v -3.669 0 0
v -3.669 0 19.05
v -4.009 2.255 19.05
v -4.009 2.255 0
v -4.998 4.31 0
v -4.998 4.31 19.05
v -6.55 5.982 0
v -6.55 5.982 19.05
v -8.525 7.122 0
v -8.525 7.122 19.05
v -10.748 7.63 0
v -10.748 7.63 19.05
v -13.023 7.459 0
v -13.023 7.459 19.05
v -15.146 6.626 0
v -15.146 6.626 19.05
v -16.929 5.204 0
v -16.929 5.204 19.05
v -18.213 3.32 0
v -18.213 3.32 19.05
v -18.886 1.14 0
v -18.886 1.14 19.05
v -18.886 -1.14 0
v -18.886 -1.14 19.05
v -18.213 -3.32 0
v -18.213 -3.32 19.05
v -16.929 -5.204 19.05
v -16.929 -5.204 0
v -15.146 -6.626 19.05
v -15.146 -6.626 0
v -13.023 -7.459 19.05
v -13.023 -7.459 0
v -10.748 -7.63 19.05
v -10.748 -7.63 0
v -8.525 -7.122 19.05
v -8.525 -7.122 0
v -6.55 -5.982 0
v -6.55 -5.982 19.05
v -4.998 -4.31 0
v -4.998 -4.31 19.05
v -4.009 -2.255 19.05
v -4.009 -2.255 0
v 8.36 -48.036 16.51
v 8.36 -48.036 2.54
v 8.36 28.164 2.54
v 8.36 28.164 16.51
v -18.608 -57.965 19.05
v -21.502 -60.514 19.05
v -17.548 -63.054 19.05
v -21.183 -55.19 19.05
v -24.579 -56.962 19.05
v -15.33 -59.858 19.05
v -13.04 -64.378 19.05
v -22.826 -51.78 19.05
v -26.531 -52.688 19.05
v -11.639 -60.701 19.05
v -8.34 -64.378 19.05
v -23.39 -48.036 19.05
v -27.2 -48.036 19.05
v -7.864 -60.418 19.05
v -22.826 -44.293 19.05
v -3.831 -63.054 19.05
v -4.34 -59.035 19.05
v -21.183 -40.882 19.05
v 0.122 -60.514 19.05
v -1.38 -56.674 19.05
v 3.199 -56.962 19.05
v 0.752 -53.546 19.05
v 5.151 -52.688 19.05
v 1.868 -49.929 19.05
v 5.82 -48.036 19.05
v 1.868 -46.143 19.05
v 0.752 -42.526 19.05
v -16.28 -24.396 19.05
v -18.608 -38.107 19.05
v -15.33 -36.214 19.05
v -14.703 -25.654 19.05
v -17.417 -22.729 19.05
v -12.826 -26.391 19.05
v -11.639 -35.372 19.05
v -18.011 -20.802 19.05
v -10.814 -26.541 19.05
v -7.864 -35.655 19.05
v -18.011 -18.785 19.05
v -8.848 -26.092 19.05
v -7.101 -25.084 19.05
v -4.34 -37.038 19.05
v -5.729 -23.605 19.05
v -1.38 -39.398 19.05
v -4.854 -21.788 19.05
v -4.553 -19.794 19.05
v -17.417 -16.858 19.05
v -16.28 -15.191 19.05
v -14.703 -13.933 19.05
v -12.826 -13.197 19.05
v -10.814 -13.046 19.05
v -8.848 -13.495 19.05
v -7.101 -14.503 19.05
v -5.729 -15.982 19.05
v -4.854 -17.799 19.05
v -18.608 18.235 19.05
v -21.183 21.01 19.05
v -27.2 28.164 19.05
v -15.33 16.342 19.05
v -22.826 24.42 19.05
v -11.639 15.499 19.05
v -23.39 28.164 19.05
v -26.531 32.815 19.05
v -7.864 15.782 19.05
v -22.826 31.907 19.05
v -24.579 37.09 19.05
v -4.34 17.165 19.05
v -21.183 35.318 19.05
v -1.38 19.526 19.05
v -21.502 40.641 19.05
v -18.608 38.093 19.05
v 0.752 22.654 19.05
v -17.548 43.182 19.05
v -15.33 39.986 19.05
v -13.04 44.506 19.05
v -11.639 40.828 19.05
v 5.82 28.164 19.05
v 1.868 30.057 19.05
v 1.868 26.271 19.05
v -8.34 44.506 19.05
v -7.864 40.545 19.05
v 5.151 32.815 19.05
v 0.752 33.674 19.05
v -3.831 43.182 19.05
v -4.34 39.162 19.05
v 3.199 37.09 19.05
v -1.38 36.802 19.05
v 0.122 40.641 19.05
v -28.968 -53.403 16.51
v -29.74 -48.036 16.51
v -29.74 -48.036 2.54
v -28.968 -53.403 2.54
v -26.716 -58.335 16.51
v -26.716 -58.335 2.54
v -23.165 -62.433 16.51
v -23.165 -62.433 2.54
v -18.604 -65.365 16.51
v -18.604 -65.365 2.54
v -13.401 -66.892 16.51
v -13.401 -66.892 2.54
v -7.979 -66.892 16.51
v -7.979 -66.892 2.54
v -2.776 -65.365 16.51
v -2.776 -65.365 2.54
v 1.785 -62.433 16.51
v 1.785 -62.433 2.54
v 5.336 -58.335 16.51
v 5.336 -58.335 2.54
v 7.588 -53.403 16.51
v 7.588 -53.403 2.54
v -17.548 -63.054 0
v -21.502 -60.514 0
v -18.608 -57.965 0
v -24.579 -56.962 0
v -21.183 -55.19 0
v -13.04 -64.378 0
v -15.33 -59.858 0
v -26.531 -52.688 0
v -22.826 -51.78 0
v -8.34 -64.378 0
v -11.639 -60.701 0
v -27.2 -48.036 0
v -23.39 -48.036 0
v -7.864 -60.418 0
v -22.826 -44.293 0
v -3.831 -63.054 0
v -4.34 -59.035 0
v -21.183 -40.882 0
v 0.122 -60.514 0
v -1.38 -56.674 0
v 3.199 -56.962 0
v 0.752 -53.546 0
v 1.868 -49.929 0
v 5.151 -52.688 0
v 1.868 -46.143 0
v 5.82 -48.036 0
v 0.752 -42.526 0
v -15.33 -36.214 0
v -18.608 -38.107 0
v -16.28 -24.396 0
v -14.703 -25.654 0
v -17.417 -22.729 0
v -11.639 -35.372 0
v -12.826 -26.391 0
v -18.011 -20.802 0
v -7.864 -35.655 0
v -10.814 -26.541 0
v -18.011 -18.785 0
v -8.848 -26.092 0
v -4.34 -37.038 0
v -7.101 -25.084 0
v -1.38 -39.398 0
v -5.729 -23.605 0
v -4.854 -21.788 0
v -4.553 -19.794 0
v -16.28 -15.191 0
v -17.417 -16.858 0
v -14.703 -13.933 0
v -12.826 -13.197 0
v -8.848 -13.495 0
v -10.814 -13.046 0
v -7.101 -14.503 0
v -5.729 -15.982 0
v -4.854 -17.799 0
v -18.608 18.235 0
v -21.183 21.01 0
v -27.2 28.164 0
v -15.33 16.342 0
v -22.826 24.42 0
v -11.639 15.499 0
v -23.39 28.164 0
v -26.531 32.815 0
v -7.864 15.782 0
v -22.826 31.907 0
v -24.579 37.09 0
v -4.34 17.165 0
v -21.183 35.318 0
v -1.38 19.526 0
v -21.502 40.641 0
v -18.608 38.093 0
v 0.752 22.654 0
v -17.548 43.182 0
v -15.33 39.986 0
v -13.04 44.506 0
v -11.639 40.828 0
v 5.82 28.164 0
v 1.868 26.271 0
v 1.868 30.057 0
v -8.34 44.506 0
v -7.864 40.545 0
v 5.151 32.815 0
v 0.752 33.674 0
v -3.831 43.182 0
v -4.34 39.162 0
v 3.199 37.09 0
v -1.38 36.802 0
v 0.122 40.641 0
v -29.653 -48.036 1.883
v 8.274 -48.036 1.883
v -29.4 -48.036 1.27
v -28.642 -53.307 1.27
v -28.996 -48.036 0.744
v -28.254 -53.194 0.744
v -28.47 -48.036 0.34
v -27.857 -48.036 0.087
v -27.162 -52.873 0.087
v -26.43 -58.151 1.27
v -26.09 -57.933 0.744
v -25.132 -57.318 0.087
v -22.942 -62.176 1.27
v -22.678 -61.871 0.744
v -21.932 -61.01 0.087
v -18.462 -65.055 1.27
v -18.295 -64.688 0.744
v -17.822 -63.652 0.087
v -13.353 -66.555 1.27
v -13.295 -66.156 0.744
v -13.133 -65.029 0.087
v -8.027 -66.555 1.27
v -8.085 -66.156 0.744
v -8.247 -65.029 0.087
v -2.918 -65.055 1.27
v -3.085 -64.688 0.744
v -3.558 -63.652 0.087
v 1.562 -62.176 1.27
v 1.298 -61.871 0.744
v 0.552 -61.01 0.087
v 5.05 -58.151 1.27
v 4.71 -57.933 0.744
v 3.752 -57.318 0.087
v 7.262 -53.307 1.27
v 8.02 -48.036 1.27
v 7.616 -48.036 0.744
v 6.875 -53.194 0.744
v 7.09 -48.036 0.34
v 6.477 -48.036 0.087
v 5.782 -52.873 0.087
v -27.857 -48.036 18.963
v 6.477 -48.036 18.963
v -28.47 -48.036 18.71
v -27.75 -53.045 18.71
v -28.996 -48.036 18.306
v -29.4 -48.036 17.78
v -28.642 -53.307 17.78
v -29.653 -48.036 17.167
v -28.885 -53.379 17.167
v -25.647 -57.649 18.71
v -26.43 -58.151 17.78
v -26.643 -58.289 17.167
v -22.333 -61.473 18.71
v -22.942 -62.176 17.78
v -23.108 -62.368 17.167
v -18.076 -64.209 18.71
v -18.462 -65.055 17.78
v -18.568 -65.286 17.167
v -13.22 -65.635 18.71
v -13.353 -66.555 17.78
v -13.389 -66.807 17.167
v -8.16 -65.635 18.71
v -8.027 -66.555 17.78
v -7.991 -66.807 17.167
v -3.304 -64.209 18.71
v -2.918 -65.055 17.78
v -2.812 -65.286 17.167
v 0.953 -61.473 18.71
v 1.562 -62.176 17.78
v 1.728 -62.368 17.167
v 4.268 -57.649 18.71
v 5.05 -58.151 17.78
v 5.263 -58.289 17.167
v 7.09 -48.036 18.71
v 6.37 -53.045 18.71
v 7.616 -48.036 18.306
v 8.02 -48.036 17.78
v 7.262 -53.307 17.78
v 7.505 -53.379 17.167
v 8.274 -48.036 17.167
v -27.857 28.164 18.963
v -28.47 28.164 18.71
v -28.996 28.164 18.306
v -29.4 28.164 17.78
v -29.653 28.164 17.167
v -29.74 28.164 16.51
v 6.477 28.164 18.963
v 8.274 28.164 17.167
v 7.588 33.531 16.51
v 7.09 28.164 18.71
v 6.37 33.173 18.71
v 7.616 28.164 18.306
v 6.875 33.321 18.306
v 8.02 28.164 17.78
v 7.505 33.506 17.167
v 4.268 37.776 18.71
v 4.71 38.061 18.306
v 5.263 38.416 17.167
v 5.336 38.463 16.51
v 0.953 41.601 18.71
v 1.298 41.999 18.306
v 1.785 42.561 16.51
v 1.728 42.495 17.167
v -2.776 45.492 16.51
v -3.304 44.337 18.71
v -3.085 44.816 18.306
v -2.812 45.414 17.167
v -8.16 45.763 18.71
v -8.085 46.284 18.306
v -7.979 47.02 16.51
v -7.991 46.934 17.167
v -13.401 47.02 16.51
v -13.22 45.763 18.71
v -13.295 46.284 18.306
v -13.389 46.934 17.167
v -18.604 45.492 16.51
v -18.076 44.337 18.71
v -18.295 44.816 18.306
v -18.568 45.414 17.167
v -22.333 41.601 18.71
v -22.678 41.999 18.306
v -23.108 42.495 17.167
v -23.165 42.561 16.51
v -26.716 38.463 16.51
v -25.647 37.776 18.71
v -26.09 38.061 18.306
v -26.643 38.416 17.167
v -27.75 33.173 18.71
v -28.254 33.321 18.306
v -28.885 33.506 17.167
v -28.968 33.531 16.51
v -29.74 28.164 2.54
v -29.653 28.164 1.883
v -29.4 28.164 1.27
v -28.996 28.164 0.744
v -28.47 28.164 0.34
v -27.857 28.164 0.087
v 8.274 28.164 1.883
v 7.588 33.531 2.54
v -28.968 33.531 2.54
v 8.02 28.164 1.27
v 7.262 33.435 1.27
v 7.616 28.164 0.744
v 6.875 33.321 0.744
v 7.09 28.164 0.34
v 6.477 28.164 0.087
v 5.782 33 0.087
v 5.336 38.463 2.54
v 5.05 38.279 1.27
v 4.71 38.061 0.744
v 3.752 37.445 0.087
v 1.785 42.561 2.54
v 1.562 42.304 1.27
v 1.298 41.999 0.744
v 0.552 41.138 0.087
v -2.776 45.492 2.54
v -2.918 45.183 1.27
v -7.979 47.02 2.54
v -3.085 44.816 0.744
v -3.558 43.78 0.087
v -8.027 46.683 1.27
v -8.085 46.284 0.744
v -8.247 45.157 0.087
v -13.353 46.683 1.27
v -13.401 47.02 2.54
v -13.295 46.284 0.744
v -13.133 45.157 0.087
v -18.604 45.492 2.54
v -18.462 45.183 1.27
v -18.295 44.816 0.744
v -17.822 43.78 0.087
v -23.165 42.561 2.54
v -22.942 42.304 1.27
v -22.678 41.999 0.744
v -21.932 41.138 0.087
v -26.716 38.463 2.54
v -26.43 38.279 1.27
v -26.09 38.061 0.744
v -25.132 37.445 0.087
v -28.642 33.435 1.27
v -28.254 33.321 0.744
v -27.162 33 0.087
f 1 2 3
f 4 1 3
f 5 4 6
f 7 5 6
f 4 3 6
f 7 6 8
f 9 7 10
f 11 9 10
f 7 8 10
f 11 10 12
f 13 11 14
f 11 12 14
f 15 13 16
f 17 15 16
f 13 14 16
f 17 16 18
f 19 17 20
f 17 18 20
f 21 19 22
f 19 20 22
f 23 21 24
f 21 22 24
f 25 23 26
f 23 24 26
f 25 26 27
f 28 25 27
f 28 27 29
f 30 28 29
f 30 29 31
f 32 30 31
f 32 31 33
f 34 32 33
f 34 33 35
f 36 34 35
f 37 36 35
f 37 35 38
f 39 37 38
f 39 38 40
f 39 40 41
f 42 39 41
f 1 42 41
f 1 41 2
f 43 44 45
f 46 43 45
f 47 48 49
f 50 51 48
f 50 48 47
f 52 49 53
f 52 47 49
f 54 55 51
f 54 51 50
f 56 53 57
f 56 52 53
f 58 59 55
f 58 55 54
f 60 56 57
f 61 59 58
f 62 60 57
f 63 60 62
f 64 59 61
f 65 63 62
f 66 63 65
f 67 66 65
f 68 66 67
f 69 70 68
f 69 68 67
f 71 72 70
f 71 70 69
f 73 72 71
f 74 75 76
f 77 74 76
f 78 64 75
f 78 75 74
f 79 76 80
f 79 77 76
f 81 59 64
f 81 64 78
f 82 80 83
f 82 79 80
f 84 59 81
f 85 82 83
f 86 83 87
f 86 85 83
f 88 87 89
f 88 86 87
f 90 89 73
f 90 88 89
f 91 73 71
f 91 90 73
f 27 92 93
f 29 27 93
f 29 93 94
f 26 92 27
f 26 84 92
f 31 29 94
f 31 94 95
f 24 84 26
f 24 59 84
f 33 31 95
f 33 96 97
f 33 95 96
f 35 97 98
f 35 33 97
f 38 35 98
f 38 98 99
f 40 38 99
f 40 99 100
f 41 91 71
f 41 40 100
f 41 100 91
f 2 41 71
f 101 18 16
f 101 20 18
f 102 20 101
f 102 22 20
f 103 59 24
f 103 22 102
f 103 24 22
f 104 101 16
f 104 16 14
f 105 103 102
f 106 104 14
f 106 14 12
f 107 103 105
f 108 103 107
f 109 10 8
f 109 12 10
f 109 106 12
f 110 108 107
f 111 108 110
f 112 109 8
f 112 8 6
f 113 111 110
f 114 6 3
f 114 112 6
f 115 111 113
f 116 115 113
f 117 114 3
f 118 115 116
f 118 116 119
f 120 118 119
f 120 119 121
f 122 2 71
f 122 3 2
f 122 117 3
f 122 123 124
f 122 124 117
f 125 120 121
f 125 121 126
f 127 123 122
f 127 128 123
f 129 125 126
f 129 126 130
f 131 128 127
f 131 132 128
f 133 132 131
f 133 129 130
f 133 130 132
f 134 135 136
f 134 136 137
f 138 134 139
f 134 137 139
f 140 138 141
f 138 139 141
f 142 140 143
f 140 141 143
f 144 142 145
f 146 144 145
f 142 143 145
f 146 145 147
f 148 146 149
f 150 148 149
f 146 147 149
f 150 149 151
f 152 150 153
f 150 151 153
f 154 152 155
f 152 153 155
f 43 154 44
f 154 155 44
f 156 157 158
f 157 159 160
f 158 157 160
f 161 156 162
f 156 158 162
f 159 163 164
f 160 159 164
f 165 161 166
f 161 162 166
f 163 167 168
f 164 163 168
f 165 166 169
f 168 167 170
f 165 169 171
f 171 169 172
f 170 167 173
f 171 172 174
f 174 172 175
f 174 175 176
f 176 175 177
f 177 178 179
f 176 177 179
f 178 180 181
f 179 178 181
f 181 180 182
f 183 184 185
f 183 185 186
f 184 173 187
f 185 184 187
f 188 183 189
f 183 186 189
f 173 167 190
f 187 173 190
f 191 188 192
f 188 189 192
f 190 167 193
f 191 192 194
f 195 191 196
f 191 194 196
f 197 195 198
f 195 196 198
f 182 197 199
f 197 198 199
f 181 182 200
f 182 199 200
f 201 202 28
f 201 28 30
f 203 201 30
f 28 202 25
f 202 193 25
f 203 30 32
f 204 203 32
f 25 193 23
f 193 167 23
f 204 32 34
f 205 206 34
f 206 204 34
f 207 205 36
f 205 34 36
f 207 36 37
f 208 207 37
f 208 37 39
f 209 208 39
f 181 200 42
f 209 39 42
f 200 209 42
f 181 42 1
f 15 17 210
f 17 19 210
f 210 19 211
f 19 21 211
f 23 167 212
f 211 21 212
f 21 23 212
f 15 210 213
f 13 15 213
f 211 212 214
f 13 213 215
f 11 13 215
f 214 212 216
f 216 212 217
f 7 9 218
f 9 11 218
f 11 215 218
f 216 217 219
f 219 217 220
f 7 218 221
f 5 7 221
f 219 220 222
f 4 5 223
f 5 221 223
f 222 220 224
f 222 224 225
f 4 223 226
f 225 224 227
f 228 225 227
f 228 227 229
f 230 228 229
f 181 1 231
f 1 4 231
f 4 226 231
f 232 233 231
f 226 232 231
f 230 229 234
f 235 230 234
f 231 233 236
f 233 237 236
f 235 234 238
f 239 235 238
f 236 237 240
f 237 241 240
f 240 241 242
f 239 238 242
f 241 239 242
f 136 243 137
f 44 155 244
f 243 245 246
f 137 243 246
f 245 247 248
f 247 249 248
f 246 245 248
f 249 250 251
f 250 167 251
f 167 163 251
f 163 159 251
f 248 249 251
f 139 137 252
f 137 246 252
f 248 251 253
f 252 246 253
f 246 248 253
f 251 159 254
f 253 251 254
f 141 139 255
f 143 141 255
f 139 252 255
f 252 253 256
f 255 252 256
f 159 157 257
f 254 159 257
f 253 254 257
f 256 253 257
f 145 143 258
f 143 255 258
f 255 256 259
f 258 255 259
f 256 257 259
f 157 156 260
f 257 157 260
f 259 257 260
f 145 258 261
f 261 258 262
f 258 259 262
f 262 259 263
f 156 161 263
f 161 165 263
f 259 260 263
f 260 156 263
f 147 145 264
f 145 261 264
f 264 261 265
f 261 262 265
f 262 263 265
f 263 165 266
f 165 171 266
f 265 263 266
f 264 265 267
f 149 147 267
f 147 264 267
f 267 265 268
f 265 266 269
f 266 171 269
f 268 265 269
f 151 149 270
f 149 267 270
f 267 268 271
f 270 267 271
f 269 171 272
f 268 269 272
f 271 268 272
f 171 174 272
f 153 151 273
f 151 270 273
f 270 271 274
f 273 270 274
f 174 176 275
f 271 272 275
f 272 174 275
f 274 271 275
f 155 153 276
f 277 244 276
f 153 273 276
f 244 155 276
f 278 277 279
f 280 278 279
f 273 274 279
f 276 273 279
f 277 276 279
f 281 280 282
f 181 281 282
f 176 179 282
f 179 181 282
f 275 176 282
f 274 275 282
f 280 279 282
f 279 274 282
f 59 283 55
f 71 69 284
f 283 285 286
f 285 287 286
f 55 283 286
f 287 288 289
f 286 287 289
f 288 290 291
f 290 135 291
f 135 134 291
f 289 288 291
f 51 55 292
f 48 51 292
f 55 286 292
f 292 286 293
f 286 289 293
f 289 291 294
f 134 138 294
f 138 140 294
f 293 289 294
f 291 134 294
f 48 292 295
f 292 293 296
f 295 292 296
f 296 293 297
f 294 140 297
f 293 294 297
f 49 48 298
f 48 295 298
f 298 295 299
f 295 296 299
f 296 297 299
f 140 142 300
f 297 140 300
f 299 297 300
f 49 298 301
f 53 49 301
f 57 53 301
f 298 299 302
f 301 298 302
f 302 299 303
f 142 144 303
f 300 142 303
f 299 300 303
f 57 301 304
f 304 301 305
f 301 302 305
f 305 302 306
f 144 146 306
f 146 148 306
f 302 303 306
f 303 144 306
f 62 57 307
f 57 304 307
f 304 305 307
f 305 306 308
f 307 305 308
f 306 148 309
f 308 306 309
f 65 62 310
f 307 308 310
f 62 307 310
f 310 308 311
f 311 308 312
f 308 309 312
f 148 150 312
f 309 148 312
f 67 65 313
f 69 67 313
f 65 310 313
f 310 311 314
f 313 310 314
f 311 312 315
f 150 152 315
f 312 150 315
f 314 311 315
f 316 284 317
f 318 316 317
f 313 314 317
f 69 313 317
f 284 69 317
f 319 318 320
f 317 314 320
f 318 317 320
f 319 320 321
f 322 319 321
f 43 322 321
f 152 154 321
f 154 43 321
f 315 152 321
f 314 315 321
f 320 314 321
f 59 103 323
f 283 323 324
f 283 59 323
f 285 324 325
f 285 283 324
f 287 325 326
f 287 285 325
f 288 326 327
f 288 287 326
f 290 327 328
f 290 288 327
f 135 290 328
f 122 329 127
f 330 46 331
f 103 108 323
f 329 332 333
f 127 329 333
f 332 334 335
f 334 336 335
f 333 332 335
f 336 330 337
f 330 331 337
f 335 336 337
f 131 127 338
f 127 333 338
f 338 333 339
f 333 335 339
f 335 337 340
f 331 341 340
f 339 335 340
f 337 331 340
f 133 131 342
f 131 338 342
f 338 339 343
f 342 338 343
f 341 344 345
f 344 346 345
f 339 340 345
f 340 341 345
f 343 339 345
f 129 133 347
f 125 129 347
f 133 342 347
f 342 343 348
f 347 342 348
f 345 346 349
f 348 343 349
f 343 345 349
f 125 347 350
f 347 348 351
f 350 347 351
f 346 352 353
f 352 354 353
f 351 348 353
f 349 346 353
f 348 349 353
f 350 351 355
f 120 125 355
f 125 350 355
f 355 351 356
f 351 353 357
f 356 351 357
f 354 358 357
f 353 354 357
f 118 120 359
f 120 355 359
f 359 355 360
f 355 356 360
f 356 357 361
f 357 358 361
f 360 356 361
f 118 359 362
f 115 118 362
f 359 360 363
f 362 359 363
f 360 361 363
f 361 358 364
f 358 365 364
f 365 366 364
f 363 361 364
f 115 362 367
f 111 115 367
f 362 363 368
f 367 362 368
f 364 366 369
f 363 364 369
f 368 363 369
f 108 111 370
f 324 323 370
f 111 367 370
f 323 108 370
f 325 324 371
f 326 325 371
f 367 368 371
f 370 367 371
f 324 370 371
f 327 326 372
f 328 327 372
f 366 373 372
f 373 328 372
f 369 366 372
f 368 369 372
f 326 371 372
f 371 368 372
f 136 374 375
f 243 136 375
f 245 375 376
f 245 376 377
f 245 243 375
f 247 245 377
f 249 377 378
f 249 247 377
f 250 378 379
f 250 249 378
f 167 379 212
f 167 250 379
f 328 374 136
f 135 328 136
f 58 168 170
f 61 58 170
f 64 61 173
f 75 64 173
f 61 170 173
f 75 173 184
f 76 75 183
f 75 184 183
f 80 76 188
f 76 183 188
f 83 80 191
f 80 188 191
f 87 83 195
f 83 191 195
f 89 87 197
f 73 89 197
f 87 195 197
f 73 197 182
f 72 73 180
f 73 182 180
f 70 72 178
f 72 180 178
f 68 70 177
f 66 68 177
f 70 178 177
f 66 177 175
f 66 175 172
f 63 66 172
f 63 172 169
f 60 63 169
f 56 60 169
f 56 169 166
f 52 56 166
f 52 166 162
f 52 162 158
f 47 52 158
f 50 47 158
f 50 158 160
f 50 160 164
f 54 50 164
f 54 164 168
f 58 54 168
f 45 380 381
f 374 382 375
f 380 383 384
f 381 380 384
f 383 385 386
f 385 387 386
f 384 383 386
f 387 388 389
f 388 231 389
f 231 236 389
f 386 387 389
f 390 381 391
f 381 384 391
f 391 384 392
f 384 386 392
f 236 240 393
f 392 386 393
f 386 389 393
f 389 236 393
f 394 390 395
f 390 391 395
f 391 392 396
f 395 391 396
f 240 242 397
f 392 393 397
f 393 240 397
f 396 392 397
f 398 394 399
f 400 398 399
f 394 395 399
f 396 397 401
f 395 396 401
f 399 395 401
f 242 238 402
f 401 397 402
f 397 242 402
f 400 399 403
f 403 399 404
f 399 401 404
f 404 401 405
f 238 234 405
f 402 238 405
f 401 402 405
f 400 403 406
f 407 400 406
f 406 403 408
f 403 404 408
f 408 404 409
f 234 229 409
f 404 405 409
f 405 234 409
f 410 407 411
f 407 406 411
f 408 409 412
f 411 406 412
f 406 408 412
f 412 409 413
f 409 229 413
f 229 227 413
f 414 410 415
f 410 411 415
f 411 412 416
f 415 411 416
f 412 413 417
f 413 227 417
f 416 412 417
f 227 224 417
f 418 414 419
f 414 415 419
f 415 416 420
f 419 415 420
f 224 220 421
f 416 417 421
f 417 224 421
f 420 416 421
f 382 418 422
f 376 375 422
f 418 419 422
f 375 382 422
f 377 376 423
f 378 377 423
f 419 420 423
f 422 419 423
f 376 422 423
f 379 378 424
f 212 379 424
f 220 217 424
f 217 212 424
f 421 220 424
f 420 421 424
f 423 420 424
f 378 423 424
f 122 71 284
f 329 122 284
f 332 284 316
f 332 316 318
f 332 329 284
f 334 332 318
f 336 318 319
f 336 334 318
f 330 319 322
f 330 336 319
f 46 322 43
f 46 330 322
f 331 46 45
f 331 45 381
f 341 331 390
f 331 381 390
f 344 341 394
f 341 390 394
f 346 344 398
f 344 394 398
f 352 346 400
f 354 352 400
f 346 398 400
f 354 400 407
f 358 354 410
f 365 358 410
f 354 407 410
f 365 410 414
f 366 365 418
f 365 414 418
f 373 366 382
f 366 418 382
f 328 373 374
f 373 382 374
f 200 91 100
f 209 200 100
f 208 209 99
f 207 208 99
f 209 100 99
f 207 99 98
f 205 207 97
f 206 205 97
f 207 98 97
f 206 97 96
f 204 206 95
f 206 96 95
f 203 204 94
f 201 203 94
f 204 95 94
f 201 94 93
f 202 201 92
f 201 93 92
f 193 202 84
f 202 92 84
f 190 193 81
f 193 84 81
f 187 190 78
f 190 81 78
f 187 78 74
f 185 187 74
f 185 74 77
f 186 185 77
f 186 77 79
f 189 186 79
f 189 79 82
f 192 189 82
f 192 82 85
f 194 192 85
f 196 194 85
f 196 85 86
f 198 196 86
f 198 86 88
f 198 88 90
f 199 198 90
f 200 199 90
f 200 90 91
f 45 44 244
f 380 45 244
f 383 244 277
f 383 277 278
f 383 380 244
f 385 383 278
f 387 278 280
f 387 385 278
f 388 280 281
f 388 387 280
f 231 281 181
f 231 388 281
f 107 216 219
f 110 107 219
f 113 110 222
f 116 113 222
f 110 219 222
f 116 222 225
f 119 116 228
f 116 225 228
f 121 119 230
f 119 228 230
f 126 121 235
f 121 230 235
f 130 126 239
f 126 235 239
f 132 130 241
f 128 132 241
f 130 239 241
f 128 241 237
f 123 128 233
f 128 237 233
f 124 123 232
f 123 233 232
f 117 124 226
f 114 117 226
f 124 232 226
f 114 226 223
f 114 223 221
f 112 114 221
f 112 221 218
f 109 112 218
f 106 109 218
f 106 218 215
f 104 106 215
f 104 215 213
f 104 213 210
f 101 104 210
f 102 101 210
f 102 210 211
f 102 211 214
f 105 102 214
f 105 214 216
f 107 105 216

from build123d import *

# Parameters (mm, degrees)
BOSS_EXTRUDE2_DEPTH = 19.05
SKETCH2_R           = 12.7
CUT_EXTRUDE1_DEPTH  = 76.815021516
FILLET1_R           = 2.54
FILLET2_R           = 2.54
SKETCH9_R           = 7.651092206
SKETCH9_R_2         = 6.766631781
CUT_EXTRUDE7_DEPTH  = 76.815021516


with BuildPart() as part:
    # Sketch1 → Boss-Extrude2 (new body)
    with BuildSketch(Plane.XY):
        with BuildLine():
            Line((-29.739928058, 28.163848921), (-29.739928058, -48.036151079))
            ThreePointArc((-29.739928058, -48.036151079), (-10.689928058, -67.086151079), (8.360071942, -48.036151079))
            Line((8.360071942, -48.036151079), (8.360071942, 28.163848921))
            ThreePointArc((8.360071942, 28.163848921), (-10.689928058, 47.213848921), (-29.739928058, 28.163848921))
        make_face()
    extrude(amount=BOSS_EXTRUDE2_DEPTH)

    # Sketch2 → Cut-Extrude1 (cut, through all)
    with BuildSketch(Plane(origin=(0, 0, 0), x_dir=(-1, 0, 0), z_dir=(0, 0, -1))):
        with Locations((10.689928058, 28.163848921)):
            Circle(SKETCH2_R)
        with Locations((10.689928058, -48.036151079)):
            Circle(SKETCH2_R)
    extrude(amount=-CUT_EXTRUDE1_DEPTH, mode=Mode.SUBTRACT)

    # Fillet1
    fillet1_edges = [part.edges().sort_by_distance(p)[0] for p in [
        (8.360071942, -9.936151079, 19.05),
        (-10.689928058, 47.213848921, 19.05),
        (-29.739928058, -9.936151079, 19.05),
        (-10.689928058, -67.086151079, 19.05),
    ]]
    fillet(fillet1_edges, radius=FILLET1_R)

    # Fillet2
    fillet2_edges = [part.edges().sort_by_distance(p)[0] for p in [
        (-10.689928058, 47.213848921, 0),
        (8.360071942, -9.936151079, 0),
        (-10.689928058, -67.086151079, 0),
        (-29.739928058, -9.936151079, 0),
    ]]
    fillet(fillet2_edges, radius=FILLET2_R)

    # Sketch9 → Cut-Extrude7 (cut, through all)
    with BuildSketch(Plane.XY.offset(19.05)):
        with Locations((-11.320081568, 0)):
            Circle(SKETCH9_R)
        with Locations((-11.320081568, -19.793552428)):
            Circle(SKETCH9_R_2)
    extrude(amount=-CUT_EXTRUDE7_DEPTH, mode=Mode.SUBTRACT)


solid = part.part
